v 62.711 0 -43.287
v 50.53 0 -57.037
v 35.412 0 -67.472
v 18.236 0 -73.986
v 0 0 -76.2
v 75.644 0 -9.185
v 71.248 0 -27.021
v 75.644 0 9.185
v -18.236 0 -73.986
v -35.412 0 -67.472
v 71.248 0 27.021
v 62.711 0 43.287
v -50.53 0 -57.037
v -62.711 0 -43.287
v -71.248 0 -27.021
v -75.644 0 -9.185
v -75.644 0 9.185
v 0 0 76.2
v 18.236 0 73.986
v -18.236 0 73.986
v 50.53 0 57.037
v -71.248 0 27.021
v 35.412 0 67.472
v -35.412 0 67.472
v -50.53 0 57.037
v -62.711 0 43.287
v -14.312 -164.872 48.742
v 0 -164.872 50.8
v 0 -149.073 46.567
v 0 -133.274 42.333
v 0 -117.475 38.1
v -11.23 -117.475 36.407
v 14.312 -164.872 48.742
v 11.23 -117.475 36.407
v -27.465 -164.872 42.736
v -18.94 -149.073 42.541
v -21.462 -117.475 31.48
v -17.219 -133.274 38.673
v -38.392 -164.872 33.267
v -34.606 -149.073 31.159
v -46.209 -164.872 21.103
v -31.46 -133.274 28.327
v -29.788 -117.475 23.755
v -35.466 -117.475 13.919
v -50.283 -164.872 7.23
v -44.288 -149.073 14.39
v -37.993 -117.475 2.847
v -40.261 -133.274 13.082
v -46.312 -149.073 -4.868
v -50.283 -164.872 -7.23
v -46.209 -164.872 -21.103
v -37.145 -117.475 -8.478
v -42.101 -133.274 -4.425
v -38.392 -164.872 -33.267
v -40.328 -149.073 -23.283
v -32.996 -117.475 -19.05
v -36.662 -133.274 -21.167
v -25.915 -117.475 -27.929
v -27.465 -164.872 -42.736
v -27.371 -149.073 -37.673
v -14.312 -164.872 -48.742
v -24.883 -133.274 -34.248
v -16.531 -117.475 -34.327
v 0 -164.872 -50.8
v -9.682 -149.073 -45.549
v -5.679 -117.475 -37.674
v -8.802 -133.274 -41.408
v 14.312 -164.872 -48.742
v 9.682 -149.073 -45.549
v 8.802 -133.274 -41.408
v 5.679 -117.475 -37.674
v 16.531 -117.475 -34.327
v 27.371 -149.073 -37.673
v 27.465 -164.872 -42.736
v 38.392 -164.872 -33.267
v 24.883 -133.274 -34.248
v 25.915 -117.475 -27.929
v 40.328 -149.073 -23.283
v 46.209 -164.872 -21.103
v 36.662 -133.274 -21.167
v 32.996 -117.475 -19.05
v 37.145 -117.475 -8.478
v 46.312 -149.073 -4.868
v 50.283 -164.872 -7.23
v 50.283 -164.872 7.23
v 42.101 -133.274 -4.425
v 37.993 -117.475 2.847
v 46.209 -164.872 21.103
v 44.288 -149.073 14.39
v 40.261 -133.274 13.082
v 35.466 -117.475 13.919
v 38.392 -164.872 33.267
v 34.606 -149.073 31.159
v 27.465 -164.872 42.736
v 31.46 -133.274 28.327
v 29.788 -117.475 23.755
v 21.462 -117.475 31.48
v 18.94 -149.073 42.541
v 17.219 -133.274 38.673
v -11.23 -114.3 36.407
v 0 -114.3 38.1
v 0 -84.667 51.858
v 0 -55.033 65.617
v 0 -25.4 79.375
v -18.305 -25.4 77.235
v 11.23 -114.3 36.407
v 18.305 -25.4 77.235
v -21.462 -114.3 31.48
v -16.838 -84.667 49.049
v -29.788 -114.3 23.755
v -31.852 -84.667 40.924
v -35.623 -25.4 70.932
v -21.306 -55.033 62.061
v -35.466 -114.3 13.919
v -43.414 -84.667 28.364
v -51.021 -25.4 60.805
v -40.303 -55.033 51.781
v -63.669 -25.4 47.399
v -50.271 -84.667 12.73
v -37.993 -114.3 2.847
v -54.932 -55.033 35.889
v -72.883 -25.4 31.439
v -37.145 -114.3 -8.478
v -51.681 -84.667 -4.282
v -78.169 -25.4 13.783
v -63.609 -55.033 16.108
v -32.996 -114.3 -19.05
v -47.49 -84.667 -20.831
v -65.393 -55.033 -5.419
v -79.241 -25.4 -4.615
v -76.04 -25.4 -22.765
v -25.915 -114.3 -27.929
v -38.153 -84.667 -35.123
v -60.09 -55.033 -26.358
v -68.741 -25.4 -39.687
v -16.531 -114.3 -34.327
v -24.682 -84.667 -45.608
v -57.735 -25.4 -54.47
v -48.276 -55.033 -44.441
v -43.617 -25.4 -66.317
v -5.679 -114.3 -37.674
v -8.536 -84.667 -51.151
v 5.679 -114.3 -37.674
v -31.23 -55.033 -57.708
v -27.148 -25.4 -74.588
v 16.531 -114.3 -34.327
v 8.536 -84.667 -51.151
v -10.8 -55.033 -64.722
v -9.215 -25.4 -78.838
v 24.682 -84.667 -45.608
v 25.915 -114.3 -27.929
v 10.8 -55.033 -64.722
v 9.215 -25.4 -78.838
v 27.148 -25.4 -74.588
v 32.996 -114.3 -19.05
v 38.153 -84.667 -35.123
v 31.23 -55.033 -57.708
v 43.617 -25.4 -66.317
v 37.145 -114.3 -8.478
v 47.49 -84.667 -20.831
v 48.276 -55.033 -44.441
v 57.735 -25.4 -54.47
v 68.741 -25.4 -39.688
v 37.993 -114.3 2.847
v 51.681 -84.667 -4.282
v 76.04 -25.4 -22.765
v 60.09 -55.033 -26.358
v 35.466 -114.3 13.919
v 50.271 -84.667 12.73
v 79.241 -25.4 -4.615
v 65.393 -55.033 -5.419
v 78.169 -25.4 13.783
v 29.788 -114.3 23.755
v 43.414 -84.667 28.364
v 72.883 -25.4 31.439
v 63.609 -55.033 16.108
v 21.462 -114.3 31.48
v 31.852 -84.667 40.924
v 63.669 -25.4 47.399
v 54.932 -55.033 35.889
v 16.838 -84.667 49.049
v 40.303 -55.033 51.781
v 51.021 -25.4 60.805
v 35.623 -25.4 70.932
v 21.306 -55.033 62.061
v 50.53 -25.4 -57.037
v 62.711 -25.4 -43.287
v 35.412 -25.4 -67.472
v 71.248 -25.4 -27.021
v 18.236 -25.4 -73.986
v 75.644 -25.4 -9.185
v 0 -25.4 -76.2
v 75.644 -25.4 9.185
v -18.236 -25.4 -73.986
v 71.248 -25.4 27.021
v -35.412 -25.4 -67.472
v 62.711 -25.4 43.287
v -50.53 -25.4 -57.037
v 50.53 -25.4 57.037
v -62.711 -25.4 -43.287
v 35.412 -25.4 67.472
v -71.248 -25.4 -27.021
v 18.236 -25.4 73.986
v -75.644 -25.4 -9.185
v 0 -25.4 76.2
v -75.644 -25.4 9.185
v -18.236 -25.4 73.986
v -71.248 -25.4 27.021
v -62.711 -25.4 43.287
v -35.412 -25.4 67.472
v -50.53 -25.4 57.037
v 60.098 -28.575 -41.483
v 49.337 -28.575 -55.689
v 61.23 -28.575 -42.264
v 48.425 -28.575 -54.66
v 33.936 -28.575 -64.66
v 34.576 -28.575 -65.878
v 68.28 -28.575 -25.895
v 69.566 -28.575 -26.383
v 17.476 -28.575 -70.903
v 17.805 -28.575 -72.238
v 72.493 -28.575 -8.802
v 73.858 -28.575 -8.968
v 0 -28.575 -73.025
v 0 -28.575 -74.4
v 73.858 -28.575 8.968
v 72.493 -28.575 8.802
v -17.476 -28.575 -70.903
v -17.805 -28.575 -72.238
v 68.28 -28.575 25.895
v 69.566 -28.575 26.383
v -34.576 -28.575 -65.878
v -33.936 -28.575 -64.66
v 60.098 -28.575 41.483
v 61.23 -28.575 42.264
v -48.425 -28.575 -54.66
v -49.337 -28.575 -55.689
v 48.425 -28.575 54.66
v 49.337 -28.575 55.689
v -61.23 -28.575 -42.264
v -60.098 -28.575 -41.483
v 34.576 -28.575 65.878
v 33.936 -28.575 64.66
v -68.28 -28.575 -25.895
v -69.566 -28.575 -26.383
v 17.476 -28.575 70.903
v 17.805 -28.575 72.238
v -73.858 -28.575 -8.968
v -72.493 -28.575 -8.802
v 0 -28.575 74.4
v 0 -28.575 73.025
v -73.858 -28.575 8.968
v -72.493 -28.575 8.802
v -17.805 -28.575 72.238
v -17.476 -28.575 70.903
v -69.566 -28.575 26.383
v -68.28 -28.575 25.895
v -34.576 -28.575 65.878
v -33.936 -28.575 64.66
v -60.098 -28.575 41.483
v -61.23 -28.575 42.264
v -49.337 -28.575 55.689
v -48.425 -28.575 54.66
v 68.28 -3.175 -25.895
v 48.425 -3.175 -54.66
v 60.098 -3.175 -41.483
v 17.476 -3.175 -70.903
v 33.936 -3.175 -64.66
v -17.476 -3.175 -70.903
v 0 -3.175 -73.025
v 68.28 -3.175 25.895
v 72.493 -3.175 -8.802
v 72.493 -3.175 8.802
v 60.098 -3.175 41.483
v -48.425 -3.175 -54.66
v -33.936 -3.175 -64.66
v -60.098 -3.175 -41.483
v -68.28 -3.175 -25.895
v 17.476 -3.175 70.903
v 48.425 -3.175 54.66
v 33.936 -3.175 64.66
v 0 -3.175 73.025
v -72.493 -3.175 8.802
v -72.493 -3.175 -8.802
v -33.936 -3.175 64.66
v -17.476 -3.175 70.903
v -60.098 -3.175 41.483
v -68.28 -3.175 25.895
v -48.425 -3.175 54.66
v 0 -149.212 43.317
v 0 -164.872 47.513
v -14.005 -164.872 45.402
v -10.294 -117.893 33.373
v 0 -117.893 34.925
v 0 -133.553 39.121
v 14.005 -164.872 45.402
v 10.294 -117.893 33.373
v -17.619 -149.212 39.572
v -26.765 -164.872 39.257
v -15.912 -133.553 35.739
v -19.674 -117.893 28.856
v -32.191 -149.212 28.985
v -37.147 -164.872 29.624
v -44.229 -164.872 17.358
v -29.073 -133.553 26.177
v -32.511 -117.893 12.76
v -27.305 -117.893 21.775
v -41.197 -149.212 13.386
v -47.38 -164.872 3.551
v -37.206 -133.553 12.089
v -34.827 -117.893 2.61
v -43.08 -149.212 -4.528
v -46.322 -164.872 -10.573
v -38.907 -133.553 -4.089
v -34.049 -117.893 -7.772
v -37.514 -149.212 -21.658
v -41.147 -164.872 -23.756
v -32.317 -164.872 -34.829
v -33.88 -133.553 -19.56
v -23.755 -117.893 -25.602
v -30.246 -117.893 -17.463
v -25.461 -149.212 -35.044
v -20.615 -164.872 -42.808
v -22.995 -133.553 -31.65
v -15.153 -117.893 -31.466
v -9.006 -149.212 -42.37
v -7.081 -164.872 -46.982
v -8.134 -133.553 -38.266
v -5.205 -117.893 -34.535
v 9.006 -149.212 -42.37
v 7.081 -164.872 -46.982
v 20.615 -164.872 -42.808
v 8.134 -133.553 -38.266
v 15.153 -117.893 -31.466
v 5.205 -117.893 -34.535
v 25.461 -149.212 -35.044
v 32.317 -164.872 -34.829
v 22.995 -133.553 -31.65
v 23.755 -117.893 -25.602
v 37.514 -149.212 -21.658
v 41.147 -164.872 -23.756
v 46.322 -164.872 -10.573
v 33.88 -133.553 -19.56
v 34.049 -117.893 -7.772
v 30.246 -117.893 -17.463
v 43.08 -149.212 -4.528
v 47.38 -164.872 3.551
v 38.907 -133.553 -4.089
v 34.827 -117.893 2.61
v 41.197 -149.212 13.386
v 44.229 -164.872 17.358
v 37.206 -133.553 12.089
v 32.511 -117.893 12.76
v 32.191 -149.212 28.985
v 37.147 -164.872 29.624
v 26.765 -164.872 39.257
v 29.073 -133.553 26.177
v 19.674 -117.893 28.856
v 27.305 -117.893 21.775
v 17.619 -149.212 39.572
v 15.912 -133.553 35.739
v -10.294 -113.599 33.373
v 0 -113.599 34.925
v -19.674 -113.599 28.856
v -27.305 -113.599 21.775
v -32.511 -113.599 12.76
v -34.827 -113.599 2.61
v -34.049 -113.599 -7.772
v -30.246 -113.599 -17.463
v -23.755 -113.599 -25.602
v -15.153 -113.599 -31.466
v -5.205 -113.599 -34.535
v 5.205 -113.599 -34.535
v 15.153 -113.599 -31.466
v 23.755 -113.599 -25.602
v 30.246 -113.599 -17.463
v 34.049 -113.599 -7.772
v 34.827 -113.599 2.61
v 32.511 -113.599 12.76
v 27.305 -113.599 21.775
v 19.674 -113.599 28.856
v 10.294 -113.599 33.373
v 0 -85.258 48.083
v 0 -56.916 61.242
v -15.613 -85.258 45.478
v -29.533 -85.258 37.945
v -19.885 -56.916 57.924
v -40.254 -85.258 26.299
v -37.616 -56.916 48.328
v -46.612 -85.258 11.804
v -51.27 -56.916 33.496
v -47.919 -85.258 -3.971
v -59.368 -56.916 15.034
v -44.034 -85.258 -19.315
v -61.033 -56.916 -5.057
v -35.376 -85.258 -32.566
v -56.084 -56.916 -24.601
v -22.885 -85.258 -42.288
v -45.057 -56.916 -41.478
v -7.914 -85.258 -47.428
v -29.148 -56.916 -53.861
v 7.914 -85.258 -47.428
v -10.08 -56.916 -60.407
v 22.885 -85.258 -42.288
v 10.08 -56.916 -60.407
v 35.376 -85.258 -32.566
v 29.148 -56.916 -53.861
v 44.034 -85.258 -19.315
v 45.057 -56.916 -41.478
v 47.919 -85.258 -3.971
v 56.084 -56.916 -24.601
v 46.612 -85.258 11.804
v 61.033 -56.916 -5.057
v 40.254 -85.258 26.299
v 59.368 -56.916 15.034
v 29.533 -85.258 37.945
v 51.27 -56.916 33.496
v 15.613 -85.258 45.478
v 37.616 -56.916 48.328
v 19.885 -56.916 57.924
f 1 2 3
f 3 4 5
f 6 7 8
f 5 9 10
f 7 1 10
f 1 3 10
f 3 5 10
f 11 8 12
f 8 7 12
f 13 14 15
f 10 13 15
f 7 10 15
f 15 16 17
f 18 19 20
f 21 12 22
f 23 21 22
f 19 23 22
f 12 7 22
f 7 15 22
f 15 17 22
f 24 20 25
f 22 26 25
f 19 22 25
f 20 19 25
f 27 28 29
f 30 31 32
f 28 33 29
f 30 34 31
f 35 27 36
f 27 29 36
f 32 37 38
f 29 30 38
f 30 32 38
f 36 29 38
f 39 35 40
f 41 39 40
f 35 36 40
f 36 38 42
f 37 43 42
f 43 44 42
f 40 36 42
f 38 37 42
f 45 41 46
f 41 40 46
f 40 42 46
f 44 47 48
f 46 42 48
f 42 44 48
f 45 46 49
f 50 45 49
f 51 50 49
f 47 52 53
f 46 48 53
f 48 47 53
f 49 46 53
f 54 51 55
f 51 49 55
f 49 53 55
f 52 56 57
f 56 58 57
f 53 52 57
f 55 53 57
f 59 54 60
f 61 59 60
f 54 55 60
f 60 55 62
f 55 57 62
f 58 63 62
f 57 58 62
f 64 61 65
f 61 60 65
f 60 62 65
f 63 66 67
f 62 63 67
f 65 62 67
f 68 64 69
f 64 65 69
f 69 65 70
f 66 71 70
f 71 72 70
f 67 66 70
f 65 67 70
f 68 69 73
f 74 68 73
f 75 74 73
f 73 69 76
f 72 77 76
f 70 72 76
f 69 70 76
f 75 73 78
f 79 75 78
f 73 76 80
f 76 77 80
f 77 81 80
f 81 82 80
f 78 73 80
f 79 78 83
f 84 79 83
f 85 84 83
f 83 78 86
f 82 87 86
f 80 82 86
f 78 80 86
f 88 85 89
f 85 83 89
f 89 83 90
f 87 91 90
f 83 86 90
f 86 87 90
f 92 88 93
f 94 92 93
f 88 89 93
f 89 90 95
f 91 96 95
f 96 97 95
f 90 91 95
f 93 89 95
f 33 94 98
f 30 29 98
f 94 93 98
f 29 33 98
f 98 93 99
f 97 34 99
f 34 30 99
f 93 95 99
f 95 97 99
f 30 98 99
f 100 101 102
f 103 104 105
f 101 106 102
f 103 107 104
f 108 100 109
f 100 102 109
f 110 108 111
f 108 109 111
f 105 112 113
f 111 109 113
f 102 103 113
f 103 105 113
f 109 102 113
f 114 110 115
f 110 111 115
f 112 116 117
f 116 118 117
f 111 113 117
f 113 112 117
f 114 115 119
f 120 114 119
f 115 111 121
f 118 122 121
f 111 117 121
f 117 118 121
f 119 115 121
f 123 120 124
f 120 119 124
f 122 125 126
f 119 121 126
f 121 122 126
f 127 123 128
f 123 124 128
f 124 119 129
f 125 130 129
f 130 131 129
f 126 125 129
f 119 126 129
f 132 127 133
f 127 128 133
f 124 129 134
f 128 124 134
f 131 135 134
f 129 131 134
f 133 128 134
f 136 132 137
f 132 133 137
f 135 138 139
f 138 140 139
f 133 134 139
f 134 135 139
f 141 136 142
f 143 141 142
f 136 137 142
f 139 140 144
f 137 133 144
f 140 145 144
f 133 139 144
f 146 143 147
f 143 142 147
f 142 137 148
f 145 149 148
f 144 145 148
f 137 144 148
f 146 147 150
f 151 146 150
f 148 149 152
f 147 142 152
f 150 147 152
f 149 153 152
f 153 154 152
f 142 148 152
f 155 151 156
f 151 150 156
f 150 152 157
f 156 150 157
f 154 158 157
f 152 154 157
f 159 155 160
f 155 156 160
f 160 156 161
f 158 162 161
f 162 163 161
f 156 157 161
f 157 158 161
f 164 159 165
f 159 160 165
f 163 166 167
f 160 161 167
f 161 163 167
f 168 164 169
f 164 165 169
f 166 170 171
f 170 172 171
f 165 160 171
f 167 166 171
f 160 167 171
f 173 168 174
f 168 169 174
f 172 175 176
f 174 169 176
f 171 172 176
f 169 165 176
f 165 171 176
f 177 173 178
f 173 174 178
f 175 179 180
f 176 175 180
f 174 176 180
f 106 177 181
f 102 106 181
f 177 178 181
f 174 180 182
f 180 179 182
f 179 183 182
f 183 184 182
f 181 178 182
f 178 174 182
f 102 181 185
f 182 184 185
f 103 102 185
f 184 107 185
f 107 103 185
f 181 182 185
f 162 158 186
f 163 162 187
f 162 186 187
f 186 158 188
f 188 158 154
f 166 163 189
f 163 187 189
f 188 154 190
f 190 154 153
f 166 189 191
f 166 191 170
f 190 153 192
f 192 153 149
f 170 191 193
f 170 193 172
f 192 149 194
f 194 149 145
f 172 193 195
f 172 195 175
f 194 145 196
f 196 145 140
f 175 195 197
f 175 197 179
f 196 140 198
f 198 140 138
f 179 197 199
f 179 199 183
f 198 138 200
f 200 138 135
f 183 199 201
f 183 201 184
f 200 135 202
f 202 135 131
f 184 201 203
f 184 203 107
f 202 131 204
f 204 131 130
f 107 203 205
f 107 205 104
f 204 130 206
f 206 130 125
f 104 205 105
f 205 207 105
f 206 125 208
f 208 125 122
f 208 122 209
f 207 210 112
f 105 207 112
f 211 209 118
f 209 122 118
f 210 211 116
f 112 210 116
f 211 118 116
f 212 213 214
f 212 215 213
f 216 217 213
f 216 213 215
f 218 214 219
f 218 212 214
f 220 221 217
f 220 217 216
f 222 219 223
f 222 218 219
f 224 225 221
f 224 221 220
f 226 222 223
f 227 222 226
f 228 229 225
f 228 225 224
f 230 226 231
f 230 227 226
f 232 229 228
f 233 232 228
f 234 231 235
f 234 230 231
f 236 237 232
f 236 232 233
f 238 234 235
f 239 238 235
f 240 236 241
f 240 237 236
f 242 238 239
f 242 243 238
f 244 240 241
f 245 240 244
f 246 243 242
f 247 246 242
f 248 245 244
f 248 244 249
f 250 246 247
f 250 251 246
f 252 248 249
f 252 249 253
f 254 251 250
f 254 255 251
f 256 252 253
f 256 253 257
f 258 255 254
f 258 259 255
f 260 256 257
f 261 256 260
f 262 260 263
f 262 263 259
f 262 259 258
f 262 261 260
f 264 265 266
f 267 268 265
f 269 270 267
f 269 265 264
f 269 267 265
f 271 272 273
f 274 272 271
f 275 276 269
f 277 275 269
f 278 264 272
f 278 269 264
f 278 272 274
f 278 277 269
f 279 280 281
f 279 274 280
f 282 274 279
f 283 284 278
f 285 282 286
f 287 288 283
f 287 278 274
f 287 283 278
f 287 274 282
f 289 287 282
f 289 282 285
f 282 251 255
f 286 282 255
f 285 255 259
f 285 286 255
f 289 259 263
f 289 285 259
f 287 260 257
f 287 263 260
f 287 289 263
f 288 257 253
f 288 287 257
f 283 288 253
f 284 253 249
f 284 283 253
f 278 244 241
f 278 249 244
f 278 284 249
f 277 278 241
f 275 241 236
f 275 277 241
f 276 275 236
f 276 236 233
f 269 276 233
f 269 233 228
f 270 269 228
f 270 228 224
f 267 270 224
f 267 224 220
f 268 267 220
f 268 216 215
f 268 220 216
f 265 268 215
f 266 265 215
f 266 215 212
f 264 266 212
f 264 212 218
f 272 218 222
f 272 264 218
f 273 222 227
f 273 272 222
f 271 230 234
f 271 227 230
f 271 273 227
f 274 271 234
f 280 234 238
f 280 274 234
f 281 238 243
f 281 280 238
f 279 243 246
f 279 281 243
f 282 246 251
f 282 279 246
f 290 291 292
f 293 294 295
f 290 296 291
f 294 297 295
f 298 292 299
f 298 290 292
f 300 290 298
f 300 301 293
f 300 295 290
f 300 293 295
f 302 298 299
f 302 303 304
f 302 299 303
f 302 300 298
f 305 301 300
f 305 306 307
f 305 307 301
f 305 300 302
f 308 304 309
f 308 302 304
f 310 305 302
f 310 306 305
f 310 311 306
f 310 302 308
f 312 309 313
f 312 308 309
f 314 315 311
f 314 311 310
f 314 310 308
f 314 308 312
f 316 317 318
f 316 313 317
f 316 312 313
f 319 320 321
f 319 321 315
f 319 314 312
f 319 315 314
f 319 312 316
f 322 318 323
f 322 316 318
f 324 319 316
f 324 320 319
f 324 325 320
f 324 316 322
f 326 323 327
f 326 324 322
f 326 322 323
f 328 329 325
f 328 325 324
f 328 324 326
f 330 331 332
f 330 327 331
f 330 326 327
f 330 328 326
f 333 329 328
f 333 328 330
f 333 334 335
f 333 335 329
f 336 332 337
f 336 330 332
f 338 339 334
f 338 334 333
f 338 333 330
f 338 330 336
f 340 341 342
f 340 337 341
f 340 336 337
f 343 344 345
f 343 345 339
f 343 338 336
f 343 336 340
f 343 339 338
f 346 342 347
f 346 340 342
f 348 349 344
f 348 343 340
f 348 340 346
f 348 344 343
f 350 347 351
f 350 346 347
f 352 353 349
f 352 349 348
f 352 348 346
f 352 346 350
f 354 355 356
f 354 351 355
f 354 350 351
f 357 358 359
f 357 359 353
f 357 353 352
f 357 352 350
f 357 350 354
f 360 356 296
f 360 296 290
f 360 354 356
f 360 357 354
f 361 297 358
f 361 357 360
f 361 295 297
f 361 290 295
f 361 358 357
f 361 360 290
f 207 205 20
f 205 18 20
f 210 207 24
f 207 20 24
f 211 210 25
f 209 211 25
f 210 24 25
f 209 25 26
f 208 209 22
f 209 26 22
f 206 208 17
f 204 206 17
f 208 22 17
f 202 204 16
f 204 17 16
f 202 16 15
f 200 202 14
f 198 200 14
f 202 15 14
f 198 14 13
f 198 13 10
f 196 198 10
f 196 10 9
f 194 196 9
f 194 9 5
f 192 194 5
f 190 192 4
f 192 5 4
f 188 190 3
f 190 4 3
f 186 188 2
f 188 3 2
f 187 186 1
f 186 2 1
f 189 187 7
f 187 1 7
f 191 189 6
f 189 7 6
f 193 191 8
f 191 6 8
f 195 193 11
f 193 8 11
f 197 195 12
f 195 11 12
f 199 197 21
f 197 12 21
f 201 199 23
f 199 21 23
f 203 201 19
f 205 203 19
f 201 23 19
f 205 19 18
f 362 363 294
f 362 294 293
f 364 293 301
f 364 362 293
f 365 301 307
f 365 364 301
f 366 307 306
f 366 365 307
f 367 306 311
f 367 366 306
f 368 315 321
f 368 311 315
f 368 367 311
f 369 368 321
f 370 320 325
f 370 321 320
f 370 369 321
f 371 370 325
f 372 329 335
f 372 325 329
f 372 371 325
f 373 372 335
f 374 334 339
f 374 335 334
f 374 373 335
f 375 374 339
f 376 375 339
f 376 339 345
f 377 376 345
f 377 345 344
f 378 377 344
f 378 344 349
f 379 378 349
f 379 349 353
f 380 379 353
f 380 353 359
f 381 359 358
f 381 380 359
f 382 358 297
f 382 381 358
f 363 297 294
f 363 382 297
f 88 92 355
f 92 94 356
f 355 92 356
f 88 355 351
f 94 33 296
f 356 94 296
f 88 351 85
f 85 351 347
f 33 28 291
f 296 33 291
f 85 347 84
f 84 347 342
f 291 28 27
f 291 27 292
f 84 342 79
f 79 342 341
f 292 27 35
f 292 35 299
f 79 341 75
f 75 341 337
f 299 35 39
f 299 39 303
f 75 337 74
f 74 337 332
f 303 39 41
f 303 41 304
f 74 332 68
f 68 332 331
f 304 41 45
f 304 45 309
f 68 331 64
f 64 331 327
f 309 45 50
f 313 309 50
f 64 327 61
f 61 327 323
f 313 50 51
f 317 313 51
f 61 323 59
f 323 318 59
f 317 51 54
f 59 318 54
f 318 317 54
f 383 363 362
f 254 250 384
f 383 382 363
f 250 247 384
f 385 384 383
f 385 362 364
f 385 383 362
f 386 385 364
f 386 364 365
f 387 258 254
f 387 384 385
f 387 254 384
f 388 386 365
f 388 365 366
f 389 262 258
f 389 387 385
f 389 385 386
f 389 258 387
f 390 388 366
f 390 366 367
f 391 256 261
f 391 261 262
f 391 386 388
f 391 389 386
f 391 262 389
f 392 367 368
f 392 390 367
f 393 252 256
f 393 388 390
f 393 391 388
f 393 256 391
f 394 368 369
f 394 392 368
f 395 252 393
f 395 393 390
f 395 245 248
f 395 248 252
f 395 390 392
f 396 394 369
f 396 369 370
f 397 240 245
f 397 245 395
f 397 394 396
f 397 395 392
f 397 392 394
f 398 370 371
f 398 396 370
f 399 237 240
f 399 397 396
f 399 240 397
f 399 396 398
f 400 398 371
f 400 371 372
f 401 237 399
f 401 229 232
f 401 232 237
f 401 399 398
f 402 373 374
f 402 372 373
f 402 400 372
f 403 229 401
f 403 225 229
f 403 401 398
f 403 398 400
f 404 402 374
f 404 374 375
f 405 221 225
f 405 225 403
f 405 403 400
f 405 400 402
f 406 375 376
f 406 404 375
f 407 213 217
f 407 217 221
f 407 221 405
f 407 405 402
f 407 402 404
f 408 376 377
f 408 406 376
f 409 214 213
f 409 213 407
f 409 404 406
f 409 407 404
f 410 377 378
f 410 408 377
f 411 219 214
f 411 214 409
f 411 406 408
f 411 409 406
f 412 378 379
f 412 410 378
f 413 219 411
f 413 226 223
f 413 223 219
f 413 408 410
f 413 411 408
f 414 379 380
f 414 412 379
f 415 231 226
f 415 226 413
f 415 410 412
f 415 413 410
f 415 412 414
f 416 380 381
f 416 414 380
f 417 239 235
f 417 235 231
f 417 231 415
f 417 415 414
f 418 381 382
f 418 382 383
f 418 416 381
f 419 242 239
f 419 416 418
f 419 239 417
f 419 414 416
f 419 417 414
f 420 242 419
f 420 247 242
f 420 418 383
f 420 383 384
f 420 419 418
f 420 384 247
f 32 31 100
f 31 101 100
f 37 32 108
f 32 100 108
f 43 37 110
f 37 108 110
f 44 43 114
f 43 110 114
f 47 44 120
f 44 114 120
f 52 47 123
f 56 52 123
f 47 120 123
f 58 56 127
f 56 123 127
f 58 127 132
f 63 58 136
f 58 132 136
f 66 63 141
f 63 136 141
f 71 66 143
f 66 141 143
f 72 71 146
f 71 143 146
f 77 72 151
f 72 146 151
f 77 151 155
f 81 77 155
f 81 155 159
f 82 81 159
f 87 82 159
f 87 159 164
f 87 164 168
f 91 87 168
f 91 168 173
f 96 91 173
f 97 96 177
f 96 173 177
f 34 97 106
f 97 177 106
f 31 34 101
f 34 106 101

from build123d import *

# Parameters (mm, degrees)
SHELL1_T = -3.175


with BuildPart() as part:
    # Sketch1 → Revolve1 (revolve)
    with BuildSketch(Plane(origin=(0, 0, 0), x_dir=(0, 0, -1), z_dir=(1, 0, 0)), mode=Mode.PRIVATE) as revolve1_sk:
        Polygon((0, 0), (0, -164.872045256), (50.8, -164.872045256), (38.1, -117.475), (38.1, -114.3), (79.375, -25.4), (76.2, -25.4), (76.2, 0), align=None)
    revolve(revolve1_sk.sketch.rotate(Axis((0, 0, 0), (0, -1, 0)), 180), axis=Axis((0, 0, 0), (0, -1, 0)))

    # Shell1
    shell1_openings = [part.faces().sort_by_distance(p)[0] for p in [
        (0, -164.872045256, 0),
    ]]
    offset(amount=SHELL1_T, openings=shell1_openings, kind=Kind.INTERSECTION)


solid = part.part
